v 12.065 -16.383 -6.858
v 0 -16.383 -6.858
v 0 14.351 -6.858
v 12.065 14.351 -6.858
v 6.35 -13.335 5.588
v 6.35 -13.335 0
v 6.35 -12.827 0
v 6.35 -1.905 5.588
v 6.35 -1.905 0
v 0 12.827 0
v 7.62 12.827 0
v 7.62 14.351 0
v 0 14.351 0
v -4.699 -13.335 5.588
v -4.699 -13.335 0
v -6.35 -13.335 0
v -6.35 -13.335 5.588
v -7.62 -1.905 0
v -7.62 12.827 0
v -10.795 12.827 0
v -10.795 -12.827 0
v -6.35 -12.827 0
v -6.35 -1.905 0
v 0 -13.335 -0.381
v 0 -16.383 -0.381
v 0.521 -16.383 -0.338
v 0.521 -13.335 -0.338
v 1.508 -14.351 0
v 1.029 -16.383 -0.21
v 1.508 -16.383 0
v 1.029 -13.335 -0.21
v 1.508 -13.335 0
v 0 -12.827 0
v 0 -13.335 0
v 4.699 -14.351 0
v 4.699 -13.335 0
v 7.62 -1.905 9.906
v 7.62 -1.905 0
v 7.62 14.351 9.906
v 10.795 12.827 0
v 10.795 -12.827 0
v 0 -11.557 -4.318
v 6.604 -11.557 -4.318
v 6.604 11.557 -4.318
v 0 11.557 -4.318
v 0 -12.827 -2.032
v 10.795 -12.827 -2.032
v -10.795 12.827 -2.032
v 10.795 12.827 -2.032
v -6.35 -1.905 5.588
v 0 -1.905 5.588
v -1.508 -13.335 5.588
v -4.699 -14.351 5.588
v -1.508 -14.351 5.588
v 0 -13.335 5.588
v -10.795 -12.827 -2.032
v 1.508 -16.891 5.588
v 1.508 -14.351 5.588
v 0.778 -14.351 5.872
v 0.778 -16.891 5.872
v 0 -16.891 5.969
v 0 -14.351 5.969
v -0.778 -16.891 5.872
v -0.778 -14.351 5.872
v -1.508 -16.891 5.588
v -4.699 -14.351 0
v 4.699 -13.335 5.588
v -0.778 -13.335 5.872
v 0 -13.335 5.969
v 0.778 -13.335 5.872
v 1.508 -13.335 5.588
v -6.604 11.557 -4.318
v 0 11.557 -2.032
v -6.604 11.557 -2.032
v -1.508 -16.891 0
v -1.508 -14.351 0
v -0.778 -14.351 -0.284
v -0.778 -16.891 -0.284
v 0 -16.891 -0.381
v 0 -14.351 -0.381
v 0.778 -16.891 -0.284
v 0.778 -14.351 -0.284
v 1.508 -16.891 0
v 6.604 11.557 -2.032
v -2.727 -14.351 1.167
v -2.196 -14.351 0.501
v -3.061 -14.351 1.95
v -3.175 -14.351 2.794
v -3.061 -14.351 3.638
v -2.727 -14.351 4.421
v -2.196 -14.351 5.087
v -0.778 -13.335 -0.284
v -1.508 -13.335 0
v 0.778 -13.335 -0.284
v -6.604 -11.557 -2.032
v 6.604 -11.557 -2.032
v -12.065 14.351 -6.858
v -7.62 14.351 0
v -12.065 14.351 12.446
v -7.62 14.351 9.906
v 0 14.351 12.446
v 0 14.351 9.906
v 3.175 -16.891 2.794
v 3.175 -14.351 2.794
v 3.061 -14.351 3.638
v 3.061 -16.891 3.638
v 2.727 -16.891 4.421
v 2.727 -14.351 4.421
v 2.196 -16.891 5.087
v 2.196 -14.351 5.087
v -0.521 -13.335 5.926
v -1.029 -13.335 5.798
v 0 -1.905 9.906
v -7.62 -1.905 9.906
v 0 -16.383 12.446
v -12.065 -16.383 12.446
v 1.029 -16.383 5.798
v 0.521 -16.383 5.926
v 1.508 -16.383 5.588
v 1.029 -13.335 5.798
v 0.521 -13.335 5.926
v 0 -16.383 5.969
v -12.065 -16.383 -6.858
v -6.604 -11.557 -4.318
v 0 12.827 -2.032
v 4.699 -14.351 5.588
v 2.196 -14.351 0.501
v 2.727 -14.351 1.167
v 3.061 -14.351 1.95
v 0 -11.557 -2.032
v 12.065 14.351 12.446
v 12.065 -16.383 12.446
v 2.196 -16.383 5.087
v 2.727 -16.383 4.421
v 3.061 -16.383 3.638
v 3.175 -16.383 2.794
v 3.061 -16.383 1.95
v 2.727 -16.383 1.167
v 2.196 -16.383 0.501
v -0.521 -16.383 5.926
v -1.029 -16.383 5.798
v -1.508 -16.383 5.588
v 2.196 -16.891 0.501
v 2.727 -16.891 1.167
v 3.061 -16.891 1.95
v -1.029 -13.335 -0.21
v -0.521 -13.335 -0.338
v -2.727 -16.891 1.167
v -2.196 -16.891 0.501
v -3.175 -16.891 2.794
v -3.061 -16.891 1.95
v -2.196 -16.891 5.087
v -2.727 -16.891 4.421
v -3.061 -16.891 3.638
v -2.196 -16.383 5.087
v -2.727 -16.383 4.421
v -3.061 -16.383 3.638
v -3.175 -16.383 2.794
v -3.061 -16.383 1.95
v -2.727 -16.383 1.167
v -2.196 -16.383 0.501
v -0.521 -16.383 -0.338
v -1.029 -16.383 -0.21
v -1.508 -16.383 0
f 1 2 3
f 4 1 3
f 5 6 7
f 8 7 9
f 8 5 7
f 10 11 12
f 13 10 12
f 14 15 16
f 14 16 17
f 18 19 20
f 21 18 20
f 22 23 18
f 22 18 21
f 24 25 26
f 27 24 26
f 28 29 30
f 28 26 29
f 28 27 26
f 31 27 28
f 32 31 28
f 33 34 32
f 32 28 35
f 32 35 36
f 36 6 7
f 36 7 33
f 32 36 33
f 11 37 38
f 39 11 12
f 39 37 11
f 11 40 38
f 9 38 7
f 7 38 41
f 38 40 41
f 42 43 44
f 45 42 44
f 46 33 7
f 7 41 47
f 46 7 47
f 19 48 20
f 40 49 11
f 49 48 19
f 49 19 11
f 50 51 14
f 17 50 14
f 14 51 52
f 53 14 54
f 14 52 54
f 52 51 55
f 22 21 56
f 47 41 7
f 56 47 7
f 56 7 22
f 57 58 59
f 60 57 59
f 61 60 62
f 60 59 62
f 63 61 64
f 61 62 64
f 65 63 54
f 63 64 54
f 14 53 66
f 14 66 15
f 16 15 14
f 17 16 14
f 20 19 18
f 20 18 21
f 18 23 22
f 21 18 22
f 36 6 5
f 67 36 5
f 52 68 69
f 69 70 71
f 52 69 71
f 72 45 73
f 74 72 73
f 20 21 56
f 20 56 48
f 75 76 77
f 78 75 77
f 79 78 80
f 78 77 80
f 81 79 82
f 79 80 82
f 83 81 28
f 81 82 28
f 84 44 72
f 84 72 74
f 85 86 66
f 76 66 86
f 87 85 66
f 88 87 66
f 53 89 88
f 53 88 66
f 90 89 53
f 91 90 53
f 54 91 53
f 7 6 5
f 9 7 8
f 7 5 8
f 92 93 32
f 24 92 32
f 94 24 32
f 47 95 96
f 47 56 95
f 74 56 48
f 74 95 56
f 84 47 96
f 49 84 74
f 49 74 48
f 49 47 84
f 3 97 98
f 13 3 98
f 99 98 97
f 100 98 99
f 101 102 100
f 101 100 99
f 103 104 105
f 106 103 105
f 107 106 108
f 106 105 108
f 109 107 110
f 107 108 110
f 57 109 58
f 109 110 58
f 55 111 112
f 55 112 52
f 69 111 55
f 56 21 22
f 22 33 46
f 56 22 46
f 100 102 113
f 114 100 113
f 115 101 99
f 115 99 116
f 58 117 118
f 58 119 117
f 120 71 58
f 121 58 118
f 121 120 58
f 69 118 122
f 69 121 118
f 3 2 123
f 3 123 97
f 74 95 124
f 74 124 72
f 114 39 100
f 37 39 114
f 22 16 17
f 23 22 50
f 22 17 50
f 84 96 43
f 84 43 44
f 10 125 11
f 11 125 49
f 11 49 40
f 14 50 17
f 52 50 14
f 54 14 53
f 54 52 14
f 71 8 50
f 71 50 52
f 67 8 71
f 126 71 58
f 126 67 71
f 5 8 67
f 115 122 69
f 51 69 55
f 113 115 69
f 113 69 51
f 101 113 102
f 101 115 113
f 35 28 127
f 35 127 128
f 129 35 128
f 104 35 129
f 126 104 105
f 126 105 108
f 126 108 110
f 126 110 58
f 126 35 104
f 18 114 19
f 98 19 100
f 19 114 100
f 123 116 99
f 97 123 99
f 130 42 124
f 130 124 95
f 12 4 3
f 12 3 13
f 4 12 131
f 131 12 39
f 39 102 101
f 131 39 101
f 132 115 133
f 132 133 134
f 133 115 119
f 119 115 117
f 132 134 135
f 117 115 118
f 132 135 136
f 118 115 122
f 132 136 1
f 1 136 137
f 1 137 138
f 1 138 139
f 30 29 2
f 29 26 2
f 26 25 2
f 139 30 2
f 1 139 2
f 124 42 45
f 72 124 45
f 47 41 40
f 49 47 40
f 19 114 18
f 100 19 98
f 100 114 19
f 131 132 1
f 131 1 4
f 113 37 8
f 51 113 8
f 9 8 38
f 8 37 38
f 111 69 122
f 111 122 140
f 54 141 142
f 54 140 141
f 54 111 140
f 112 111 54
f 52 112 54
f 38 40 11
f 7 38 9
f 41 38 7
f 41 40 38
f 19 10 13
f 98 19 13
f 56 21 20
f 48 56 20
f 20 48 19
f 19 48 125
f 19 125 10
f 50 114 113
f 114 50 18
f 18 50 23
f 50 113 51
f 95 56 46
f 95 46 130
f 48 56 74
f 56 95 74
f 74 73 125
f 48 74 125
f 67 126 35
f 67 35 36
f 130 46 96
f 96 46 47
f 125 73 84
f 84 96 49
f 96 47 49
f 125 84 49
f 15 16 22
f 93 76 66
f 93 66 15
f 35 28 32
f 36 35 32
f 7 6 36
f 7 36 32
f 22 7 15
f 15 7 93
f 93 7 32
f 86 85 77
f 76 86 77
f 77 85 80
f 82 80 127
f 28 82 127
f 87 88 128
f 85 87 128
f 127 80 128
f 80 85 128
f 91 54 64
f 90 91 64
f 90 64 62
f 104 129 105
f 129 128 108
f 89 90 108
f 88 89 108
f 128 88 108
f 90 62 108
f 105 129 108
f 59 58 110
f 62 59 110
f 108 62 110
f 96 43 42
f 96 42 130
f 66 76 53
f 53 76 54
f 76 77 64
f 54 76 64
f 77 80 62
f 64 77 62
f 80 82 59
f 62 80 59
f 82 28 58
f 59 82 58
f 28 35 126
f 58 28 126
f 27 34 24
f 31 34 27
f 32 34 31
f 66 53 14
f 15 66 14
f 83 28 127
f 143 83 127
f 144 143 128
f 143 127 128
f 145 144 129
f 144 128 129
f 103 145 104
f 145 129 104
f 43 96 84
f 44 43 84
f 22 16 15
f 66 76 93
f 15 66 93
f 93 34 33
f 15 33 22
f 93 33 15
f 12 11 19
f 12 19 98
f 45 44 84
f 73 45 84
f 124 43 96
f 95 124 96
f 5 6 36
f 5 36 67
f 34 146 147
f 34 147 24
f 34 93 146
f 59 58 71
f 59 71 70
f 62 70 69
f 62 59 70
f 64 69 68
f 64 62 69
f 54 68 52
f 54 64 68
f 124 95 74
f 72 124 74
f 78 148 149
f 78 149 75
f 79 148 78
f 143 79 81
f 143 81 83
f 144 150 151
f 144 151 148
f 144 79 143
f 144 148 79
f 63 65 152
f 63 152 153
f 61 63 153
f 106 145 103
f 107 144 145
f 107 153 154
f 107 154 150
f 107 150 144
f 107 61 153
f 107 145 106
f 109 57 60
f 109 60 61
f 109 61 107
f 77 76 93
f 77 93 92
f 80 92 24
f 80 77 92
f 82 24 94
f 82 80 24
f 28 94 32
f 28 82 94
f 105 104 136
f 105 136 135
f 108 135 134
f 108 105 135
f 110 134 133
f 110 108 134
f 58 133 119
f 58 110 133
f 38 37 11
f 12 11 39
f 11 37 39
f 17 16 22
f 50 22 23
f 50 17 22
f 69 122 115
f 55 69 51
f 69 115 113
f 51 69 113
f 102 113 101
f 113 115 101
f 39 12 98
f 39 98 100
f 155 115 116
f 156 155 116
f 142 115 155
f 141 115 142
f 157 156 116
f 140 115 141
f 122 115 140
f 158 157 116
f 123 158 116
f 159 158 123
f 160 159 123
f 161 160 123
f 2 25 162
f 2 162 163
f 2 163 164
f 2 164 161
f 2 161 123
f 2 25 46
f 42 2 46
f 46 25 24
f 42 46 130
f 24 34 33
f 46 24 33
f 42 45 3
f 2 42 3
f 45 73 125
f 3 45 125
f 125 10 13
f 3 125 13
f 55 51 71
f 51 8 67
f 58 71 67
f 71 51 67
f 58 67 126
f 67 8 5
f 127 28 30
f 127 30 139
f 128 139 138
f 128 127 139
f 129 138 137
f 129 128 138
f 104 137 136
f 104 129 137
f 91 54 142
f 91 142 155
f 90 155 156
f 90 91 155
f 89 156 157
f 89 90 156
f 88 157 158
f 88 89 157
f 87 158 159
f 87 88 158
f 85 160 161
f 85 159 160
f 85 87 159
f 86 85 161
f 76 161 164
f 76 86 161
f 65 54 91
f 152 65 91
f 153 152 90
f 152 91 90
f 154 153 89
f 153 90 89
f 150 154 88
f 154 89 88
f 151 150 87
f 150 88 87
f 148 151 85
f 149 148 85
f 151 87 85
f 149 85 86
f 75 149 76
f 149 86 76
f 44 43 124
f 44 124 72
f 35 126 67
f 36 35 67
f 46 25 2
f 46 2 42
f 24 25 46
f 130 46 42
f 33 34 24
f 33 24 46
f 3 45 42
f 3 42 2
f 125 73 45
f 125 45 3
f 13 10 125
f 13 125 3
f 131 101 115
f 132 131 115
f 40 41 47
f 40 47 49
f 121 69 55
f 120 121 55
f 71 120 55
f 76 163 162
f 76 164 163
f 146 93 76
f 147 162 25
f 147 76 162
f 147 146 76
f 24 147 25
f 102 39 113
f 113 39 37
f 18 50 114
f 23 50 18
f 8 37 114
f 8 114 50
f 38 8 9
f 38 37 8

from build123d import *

# Parameters (mm, degrees)
F1_DEPTH  = 10.795
F0_W      = 11.557
F0_H      = 2.286
F2_DEPTH  = 6.604
F3_DEPTH  = 7.62
F0_W_2    = 10.922
F0_H_2    = 5.588
F0_W_3    = 0.508
F4_DEPTH  = 6.35
F0_W_4    = 1.016
F5_DEPTH  = 4.699
F7_DEPTH  = 2.54
F8_DEPTH  = 1.016
F9_DEPTH  = 12.065
F10_DEPTH = 12.065


with BuildPart() as f1:
    # F0 (on Right) → F1 (new body, symmetric)
    with BuildSketch(Plane.YZ):
        Polygon((0, -2.032), (0, 0), (-1.905, 0), (-12.827, 0), (-12.827, -2.032), (-11.557, -2.032), align=None)
        Polygon((12.827, 0), (0, 0), (0, -2.032), (11.557, -2.032), (12.827, -2.032), align=None)
    extrude(amount=F1_DEPTH, both=True)

    # F0 (on Right) → F2 (join, symmetric)
    with BuildSketch(Plane.YZ):
        with Locations((-5.7785, -3.175)):
            Rectangle(F0_W, F0_H)
        with Locations((5.7785, -3.175)):
            Rectangle(F0_W, F0_H)
    extrude(amount=F2_DEPTH, both=True)

    # F0 (on Right) → F3 (join, symmetric)
    with BuildSketch(Plane.YZ):
        Polygon((-1.905, 0), (0, 0), (12.827, 0), (14.351, 0), (14.351, 9.906), (-1.905, 9.906), (-1.905, 5.588), align=None)
    extrude(amount=F3_DEPTH, both=True)

    # F0 (on Right) → F4 (join, symmetric)
    with BuildSketch(Plane.YZ):
        with Locations((-7.366, 2.794)):
            Rectangle(F0_W_2, F0_H_2)
        with Locations((-13.081, 2.794)):
            Rectangle(F0_W_3, F0_H_2)
    extrude(amount=F4_DEPTH, both=True)

    # F0 (on Right) → F5 (join, symmetric)
    with BuildSketch(Plane.YZ):
        with Locations((-13.843, 2.794)):
            Rectangle(F0_W_4, F0_H_2)
    extrude(amount=F5_DEPTH, both=True)

    # F6 (on face) → F8 (join)
    with BuildSketch(Plane.XZ.offset(14.351)):
        with BuildLine():
            Line((1.5080414451, 5.588), (0, 5.588))
            Line((0, 5.588), (0, 0))
            Line((0, 0), (1.5080414451, 0))
            ThreePointArc((1.5080414451, 0), (2.726596467, 1.1672557958), (3.175, 2.794))
            ThreePointArc((3.175, 2.794), (2.726596467, 4.4207442042), (1.5080414451, 5.588))
        make_face()
        with BuildLine():
            Line((-1.5080414451, 5.588), (0, 5.588))
            Line((0, 5.588), (1.5080414451, 5.588))
            ThreePointArc((1.5080414451, 5.588), (0, 5.969), (-1.5080414451, 5.588))
        make_face()
        with BuildLine():
            Line((1.5080414451, 0), (0, 0))
            Line((0, 0), (-1.5080414451, 0))
            ThreePointArc((-1.5080414451, 0), (0, -0.381), (1.5080414451, 0))
        make_face()
    extrude(amount=-F8_DEPTH)


with BuildPart() as f7:
    # F6 (on face) → F7 (new body)
    with BuildSketch(Plane.XZ.offset(14.351)):
        with BuildLine():
            Line((1.5080414451, 5.588), (0, 5.588))
            Line((0, 5.588), (0, 0))
            Line((0, 0), (1.5080414451, 0))
            ThreePointArc((1.5080414451, 0), (2.726596467, 1.1672557958), (3.175, 2.794))
            ThreePointArc((3.175, 2.794), (2.726596467, 4.4207442042), (1.5080414451, 5.588))
        make_face()
        with BuildLine():
            Line((-1.5080414451, 5.588), (0, 5.588))
            Line((0, 5.588), (1.5080414451, 5.588))
            ThreePointArc((1.5080414451, 5.588), (0, 5.969), (-1.5080414451, 5.588))
        make_face()
        with BuildLine():
            Line((0, 0), (0, 5.588))
            Line((0, 5.588), (-1.5080414451, 5.588))
            ThreePointArc((-1.5080414451, 5.588), (-3.175, 2.794), (-1.5080414451, 0))
            Line((-1.5080414451, 0), (0, 0))
        make_face()
        with BuildLine():
            Line((1.5080414451, 0), (0, 0))
            Line((0, 0), (-1.5080414451, 0))
            ThreePointArc((-1.5080414451, 0), (0, -0.381), (1.5080414451, 0))
        make_face()
    extrude(amount=F7_DEPTH)


with BuildPart() as f9:
    # F0 (on Right) → F9 (new body)
    with BuildSketch(Plane.YZ):
        Polygon((-12.827, 5.588), (-1.905, 5.588), (-1.905, 9.906), (14.351, 9.906), (14.351, 12.446), (-16.383, 12.446), (-16.383, 0), (-14.351, 0), (-14.351, 5.588), (-13.335, 5.588), align=None)
        Polygon((-12.827, -2.032), (-12.827, 0), (-13.335, 0), (-14.351, 0), (-16.383, 0), (-16.383, -6.858), (-11.557, -6.858), (-11.557, -4.318), (-11.557, -2.032), align=None)
        Polygon((14.351, 0), (12.827, 0), (12.827, -2.032), (11.557, -2.032), (11.557, -4.318), (0, -4.318), (-11.557, -4.318), (-11.557, -6.858), (14.351, -6.858), align=None)
        with Locations((-13.843, 2.794)):
            Rectangle(F0_W_4, F0_H_2)
        with Locations((-7.366, 2.794)):
            Rectangle(F0_W_2, F0_H_2)
        with Locations((-13.081, 2.794)):
            Rectangle(F0_W_3, F0_H_2)
        Polygon((0, -2.032), (0, 0), (-1.905, 0), (-12.827, 0), (-12.827, -2.032), (-11.557, -2.032), align=None)
        with Locations((-5.7785, -3.175)):
            Rectangle(F0_W, F0_H)
        with Locations((5.7785, -3.175)):
            Rectangle(F0_W, F0_H)
        Polygon((12.827, 0), (0, 0), (0, -2.032), (11.557, -2.032), (12.827, -2.032), align=None)
        Polygon((-1.905, 0), (0, 0), (12.827, 0), (14.351, 0), (14.351, 9.906), (-1.905, 9.906), (-1.905, 5.588), align=None)
    extrude(amount=F9_DEPTH)

    # F11: cut F1, F7
    add(f1.part, mode=Mode.SUBTRACT)
    add(f7.part, mode=Mode.SUBTRACT)


with BuildPart() as f10:
    # F0 (on Right) → F10 (new body)
    with BuildSketch(Plane.YZ):
        Polygon((-12.827, 5.588), (-1.905, 5.588), (-1.905, 9.906), (14.351, 9.906), (14.351, 12.446), (-16.383, 12.446), (-16.383, 0), (-14.351, 0), (-14.351, 5.588), (-13.335, 5.588), align=None)
        Polygon((-1.905, 0), (0, 0), (12.827, 0), (14.351, 0), (14.351, 9.906), (-1.905, 9.906), (-1.905, 5.588), align=None)
        with Locations((-7.366, 2.794)):
            Rectangle(F0_W_2, F0_H_2)
        with Locations((-13.081, 2.794)):
            Rectangle(F0_W_3, F0_H_2)
        with Locations((-13.843, 2.794)):
            Rectangle(F0_W_4, F0_H_2)
        Polygon((-12.827, -2.032), (-12.827, 0), (-13.335, 0), (-14.351, 0), (-16.383, 0), (-16.383, -6.858), (-11.557, -6.858), (-11.557, -4.318), (-11.557, -2.032), align=None)
        Polygon((0, -2.032), (0, 0), (-1.905, 0), (-12.827, 0), (-12.827, -2.032), (-11.557, -2.032), align=None)
        with Locations((-5.7785, -3.175)):
            Rectangle(F0_W, F0_H)
        Polygon((14.351, 0), (12.827, 0), (12.827, -2.032), (11.557, -2.032), (11.557, -4.318), (0, -4.318), (-11.557, -4.318), (-11.557, -6.858), (14.351, -6.858), align=None)
        with Locations((5.7785, -3.175)):
            Rectangle(F0_W, F0_H)
        Polygon((12.827, 0), (0, 0), (0, -2.032), (11.557, -2.032), (12.827, -2.032), align=None)
    extrude(amount=-F10_DEPTH)

    # F11: cut F1, F7
    add(f1.part, mode=Mode.SUBTRACT)
    add(f7.part, mode=Mode.SUBTRACT)


solid = Compound([f1.part, f7.part, f9.part, f10.part])
